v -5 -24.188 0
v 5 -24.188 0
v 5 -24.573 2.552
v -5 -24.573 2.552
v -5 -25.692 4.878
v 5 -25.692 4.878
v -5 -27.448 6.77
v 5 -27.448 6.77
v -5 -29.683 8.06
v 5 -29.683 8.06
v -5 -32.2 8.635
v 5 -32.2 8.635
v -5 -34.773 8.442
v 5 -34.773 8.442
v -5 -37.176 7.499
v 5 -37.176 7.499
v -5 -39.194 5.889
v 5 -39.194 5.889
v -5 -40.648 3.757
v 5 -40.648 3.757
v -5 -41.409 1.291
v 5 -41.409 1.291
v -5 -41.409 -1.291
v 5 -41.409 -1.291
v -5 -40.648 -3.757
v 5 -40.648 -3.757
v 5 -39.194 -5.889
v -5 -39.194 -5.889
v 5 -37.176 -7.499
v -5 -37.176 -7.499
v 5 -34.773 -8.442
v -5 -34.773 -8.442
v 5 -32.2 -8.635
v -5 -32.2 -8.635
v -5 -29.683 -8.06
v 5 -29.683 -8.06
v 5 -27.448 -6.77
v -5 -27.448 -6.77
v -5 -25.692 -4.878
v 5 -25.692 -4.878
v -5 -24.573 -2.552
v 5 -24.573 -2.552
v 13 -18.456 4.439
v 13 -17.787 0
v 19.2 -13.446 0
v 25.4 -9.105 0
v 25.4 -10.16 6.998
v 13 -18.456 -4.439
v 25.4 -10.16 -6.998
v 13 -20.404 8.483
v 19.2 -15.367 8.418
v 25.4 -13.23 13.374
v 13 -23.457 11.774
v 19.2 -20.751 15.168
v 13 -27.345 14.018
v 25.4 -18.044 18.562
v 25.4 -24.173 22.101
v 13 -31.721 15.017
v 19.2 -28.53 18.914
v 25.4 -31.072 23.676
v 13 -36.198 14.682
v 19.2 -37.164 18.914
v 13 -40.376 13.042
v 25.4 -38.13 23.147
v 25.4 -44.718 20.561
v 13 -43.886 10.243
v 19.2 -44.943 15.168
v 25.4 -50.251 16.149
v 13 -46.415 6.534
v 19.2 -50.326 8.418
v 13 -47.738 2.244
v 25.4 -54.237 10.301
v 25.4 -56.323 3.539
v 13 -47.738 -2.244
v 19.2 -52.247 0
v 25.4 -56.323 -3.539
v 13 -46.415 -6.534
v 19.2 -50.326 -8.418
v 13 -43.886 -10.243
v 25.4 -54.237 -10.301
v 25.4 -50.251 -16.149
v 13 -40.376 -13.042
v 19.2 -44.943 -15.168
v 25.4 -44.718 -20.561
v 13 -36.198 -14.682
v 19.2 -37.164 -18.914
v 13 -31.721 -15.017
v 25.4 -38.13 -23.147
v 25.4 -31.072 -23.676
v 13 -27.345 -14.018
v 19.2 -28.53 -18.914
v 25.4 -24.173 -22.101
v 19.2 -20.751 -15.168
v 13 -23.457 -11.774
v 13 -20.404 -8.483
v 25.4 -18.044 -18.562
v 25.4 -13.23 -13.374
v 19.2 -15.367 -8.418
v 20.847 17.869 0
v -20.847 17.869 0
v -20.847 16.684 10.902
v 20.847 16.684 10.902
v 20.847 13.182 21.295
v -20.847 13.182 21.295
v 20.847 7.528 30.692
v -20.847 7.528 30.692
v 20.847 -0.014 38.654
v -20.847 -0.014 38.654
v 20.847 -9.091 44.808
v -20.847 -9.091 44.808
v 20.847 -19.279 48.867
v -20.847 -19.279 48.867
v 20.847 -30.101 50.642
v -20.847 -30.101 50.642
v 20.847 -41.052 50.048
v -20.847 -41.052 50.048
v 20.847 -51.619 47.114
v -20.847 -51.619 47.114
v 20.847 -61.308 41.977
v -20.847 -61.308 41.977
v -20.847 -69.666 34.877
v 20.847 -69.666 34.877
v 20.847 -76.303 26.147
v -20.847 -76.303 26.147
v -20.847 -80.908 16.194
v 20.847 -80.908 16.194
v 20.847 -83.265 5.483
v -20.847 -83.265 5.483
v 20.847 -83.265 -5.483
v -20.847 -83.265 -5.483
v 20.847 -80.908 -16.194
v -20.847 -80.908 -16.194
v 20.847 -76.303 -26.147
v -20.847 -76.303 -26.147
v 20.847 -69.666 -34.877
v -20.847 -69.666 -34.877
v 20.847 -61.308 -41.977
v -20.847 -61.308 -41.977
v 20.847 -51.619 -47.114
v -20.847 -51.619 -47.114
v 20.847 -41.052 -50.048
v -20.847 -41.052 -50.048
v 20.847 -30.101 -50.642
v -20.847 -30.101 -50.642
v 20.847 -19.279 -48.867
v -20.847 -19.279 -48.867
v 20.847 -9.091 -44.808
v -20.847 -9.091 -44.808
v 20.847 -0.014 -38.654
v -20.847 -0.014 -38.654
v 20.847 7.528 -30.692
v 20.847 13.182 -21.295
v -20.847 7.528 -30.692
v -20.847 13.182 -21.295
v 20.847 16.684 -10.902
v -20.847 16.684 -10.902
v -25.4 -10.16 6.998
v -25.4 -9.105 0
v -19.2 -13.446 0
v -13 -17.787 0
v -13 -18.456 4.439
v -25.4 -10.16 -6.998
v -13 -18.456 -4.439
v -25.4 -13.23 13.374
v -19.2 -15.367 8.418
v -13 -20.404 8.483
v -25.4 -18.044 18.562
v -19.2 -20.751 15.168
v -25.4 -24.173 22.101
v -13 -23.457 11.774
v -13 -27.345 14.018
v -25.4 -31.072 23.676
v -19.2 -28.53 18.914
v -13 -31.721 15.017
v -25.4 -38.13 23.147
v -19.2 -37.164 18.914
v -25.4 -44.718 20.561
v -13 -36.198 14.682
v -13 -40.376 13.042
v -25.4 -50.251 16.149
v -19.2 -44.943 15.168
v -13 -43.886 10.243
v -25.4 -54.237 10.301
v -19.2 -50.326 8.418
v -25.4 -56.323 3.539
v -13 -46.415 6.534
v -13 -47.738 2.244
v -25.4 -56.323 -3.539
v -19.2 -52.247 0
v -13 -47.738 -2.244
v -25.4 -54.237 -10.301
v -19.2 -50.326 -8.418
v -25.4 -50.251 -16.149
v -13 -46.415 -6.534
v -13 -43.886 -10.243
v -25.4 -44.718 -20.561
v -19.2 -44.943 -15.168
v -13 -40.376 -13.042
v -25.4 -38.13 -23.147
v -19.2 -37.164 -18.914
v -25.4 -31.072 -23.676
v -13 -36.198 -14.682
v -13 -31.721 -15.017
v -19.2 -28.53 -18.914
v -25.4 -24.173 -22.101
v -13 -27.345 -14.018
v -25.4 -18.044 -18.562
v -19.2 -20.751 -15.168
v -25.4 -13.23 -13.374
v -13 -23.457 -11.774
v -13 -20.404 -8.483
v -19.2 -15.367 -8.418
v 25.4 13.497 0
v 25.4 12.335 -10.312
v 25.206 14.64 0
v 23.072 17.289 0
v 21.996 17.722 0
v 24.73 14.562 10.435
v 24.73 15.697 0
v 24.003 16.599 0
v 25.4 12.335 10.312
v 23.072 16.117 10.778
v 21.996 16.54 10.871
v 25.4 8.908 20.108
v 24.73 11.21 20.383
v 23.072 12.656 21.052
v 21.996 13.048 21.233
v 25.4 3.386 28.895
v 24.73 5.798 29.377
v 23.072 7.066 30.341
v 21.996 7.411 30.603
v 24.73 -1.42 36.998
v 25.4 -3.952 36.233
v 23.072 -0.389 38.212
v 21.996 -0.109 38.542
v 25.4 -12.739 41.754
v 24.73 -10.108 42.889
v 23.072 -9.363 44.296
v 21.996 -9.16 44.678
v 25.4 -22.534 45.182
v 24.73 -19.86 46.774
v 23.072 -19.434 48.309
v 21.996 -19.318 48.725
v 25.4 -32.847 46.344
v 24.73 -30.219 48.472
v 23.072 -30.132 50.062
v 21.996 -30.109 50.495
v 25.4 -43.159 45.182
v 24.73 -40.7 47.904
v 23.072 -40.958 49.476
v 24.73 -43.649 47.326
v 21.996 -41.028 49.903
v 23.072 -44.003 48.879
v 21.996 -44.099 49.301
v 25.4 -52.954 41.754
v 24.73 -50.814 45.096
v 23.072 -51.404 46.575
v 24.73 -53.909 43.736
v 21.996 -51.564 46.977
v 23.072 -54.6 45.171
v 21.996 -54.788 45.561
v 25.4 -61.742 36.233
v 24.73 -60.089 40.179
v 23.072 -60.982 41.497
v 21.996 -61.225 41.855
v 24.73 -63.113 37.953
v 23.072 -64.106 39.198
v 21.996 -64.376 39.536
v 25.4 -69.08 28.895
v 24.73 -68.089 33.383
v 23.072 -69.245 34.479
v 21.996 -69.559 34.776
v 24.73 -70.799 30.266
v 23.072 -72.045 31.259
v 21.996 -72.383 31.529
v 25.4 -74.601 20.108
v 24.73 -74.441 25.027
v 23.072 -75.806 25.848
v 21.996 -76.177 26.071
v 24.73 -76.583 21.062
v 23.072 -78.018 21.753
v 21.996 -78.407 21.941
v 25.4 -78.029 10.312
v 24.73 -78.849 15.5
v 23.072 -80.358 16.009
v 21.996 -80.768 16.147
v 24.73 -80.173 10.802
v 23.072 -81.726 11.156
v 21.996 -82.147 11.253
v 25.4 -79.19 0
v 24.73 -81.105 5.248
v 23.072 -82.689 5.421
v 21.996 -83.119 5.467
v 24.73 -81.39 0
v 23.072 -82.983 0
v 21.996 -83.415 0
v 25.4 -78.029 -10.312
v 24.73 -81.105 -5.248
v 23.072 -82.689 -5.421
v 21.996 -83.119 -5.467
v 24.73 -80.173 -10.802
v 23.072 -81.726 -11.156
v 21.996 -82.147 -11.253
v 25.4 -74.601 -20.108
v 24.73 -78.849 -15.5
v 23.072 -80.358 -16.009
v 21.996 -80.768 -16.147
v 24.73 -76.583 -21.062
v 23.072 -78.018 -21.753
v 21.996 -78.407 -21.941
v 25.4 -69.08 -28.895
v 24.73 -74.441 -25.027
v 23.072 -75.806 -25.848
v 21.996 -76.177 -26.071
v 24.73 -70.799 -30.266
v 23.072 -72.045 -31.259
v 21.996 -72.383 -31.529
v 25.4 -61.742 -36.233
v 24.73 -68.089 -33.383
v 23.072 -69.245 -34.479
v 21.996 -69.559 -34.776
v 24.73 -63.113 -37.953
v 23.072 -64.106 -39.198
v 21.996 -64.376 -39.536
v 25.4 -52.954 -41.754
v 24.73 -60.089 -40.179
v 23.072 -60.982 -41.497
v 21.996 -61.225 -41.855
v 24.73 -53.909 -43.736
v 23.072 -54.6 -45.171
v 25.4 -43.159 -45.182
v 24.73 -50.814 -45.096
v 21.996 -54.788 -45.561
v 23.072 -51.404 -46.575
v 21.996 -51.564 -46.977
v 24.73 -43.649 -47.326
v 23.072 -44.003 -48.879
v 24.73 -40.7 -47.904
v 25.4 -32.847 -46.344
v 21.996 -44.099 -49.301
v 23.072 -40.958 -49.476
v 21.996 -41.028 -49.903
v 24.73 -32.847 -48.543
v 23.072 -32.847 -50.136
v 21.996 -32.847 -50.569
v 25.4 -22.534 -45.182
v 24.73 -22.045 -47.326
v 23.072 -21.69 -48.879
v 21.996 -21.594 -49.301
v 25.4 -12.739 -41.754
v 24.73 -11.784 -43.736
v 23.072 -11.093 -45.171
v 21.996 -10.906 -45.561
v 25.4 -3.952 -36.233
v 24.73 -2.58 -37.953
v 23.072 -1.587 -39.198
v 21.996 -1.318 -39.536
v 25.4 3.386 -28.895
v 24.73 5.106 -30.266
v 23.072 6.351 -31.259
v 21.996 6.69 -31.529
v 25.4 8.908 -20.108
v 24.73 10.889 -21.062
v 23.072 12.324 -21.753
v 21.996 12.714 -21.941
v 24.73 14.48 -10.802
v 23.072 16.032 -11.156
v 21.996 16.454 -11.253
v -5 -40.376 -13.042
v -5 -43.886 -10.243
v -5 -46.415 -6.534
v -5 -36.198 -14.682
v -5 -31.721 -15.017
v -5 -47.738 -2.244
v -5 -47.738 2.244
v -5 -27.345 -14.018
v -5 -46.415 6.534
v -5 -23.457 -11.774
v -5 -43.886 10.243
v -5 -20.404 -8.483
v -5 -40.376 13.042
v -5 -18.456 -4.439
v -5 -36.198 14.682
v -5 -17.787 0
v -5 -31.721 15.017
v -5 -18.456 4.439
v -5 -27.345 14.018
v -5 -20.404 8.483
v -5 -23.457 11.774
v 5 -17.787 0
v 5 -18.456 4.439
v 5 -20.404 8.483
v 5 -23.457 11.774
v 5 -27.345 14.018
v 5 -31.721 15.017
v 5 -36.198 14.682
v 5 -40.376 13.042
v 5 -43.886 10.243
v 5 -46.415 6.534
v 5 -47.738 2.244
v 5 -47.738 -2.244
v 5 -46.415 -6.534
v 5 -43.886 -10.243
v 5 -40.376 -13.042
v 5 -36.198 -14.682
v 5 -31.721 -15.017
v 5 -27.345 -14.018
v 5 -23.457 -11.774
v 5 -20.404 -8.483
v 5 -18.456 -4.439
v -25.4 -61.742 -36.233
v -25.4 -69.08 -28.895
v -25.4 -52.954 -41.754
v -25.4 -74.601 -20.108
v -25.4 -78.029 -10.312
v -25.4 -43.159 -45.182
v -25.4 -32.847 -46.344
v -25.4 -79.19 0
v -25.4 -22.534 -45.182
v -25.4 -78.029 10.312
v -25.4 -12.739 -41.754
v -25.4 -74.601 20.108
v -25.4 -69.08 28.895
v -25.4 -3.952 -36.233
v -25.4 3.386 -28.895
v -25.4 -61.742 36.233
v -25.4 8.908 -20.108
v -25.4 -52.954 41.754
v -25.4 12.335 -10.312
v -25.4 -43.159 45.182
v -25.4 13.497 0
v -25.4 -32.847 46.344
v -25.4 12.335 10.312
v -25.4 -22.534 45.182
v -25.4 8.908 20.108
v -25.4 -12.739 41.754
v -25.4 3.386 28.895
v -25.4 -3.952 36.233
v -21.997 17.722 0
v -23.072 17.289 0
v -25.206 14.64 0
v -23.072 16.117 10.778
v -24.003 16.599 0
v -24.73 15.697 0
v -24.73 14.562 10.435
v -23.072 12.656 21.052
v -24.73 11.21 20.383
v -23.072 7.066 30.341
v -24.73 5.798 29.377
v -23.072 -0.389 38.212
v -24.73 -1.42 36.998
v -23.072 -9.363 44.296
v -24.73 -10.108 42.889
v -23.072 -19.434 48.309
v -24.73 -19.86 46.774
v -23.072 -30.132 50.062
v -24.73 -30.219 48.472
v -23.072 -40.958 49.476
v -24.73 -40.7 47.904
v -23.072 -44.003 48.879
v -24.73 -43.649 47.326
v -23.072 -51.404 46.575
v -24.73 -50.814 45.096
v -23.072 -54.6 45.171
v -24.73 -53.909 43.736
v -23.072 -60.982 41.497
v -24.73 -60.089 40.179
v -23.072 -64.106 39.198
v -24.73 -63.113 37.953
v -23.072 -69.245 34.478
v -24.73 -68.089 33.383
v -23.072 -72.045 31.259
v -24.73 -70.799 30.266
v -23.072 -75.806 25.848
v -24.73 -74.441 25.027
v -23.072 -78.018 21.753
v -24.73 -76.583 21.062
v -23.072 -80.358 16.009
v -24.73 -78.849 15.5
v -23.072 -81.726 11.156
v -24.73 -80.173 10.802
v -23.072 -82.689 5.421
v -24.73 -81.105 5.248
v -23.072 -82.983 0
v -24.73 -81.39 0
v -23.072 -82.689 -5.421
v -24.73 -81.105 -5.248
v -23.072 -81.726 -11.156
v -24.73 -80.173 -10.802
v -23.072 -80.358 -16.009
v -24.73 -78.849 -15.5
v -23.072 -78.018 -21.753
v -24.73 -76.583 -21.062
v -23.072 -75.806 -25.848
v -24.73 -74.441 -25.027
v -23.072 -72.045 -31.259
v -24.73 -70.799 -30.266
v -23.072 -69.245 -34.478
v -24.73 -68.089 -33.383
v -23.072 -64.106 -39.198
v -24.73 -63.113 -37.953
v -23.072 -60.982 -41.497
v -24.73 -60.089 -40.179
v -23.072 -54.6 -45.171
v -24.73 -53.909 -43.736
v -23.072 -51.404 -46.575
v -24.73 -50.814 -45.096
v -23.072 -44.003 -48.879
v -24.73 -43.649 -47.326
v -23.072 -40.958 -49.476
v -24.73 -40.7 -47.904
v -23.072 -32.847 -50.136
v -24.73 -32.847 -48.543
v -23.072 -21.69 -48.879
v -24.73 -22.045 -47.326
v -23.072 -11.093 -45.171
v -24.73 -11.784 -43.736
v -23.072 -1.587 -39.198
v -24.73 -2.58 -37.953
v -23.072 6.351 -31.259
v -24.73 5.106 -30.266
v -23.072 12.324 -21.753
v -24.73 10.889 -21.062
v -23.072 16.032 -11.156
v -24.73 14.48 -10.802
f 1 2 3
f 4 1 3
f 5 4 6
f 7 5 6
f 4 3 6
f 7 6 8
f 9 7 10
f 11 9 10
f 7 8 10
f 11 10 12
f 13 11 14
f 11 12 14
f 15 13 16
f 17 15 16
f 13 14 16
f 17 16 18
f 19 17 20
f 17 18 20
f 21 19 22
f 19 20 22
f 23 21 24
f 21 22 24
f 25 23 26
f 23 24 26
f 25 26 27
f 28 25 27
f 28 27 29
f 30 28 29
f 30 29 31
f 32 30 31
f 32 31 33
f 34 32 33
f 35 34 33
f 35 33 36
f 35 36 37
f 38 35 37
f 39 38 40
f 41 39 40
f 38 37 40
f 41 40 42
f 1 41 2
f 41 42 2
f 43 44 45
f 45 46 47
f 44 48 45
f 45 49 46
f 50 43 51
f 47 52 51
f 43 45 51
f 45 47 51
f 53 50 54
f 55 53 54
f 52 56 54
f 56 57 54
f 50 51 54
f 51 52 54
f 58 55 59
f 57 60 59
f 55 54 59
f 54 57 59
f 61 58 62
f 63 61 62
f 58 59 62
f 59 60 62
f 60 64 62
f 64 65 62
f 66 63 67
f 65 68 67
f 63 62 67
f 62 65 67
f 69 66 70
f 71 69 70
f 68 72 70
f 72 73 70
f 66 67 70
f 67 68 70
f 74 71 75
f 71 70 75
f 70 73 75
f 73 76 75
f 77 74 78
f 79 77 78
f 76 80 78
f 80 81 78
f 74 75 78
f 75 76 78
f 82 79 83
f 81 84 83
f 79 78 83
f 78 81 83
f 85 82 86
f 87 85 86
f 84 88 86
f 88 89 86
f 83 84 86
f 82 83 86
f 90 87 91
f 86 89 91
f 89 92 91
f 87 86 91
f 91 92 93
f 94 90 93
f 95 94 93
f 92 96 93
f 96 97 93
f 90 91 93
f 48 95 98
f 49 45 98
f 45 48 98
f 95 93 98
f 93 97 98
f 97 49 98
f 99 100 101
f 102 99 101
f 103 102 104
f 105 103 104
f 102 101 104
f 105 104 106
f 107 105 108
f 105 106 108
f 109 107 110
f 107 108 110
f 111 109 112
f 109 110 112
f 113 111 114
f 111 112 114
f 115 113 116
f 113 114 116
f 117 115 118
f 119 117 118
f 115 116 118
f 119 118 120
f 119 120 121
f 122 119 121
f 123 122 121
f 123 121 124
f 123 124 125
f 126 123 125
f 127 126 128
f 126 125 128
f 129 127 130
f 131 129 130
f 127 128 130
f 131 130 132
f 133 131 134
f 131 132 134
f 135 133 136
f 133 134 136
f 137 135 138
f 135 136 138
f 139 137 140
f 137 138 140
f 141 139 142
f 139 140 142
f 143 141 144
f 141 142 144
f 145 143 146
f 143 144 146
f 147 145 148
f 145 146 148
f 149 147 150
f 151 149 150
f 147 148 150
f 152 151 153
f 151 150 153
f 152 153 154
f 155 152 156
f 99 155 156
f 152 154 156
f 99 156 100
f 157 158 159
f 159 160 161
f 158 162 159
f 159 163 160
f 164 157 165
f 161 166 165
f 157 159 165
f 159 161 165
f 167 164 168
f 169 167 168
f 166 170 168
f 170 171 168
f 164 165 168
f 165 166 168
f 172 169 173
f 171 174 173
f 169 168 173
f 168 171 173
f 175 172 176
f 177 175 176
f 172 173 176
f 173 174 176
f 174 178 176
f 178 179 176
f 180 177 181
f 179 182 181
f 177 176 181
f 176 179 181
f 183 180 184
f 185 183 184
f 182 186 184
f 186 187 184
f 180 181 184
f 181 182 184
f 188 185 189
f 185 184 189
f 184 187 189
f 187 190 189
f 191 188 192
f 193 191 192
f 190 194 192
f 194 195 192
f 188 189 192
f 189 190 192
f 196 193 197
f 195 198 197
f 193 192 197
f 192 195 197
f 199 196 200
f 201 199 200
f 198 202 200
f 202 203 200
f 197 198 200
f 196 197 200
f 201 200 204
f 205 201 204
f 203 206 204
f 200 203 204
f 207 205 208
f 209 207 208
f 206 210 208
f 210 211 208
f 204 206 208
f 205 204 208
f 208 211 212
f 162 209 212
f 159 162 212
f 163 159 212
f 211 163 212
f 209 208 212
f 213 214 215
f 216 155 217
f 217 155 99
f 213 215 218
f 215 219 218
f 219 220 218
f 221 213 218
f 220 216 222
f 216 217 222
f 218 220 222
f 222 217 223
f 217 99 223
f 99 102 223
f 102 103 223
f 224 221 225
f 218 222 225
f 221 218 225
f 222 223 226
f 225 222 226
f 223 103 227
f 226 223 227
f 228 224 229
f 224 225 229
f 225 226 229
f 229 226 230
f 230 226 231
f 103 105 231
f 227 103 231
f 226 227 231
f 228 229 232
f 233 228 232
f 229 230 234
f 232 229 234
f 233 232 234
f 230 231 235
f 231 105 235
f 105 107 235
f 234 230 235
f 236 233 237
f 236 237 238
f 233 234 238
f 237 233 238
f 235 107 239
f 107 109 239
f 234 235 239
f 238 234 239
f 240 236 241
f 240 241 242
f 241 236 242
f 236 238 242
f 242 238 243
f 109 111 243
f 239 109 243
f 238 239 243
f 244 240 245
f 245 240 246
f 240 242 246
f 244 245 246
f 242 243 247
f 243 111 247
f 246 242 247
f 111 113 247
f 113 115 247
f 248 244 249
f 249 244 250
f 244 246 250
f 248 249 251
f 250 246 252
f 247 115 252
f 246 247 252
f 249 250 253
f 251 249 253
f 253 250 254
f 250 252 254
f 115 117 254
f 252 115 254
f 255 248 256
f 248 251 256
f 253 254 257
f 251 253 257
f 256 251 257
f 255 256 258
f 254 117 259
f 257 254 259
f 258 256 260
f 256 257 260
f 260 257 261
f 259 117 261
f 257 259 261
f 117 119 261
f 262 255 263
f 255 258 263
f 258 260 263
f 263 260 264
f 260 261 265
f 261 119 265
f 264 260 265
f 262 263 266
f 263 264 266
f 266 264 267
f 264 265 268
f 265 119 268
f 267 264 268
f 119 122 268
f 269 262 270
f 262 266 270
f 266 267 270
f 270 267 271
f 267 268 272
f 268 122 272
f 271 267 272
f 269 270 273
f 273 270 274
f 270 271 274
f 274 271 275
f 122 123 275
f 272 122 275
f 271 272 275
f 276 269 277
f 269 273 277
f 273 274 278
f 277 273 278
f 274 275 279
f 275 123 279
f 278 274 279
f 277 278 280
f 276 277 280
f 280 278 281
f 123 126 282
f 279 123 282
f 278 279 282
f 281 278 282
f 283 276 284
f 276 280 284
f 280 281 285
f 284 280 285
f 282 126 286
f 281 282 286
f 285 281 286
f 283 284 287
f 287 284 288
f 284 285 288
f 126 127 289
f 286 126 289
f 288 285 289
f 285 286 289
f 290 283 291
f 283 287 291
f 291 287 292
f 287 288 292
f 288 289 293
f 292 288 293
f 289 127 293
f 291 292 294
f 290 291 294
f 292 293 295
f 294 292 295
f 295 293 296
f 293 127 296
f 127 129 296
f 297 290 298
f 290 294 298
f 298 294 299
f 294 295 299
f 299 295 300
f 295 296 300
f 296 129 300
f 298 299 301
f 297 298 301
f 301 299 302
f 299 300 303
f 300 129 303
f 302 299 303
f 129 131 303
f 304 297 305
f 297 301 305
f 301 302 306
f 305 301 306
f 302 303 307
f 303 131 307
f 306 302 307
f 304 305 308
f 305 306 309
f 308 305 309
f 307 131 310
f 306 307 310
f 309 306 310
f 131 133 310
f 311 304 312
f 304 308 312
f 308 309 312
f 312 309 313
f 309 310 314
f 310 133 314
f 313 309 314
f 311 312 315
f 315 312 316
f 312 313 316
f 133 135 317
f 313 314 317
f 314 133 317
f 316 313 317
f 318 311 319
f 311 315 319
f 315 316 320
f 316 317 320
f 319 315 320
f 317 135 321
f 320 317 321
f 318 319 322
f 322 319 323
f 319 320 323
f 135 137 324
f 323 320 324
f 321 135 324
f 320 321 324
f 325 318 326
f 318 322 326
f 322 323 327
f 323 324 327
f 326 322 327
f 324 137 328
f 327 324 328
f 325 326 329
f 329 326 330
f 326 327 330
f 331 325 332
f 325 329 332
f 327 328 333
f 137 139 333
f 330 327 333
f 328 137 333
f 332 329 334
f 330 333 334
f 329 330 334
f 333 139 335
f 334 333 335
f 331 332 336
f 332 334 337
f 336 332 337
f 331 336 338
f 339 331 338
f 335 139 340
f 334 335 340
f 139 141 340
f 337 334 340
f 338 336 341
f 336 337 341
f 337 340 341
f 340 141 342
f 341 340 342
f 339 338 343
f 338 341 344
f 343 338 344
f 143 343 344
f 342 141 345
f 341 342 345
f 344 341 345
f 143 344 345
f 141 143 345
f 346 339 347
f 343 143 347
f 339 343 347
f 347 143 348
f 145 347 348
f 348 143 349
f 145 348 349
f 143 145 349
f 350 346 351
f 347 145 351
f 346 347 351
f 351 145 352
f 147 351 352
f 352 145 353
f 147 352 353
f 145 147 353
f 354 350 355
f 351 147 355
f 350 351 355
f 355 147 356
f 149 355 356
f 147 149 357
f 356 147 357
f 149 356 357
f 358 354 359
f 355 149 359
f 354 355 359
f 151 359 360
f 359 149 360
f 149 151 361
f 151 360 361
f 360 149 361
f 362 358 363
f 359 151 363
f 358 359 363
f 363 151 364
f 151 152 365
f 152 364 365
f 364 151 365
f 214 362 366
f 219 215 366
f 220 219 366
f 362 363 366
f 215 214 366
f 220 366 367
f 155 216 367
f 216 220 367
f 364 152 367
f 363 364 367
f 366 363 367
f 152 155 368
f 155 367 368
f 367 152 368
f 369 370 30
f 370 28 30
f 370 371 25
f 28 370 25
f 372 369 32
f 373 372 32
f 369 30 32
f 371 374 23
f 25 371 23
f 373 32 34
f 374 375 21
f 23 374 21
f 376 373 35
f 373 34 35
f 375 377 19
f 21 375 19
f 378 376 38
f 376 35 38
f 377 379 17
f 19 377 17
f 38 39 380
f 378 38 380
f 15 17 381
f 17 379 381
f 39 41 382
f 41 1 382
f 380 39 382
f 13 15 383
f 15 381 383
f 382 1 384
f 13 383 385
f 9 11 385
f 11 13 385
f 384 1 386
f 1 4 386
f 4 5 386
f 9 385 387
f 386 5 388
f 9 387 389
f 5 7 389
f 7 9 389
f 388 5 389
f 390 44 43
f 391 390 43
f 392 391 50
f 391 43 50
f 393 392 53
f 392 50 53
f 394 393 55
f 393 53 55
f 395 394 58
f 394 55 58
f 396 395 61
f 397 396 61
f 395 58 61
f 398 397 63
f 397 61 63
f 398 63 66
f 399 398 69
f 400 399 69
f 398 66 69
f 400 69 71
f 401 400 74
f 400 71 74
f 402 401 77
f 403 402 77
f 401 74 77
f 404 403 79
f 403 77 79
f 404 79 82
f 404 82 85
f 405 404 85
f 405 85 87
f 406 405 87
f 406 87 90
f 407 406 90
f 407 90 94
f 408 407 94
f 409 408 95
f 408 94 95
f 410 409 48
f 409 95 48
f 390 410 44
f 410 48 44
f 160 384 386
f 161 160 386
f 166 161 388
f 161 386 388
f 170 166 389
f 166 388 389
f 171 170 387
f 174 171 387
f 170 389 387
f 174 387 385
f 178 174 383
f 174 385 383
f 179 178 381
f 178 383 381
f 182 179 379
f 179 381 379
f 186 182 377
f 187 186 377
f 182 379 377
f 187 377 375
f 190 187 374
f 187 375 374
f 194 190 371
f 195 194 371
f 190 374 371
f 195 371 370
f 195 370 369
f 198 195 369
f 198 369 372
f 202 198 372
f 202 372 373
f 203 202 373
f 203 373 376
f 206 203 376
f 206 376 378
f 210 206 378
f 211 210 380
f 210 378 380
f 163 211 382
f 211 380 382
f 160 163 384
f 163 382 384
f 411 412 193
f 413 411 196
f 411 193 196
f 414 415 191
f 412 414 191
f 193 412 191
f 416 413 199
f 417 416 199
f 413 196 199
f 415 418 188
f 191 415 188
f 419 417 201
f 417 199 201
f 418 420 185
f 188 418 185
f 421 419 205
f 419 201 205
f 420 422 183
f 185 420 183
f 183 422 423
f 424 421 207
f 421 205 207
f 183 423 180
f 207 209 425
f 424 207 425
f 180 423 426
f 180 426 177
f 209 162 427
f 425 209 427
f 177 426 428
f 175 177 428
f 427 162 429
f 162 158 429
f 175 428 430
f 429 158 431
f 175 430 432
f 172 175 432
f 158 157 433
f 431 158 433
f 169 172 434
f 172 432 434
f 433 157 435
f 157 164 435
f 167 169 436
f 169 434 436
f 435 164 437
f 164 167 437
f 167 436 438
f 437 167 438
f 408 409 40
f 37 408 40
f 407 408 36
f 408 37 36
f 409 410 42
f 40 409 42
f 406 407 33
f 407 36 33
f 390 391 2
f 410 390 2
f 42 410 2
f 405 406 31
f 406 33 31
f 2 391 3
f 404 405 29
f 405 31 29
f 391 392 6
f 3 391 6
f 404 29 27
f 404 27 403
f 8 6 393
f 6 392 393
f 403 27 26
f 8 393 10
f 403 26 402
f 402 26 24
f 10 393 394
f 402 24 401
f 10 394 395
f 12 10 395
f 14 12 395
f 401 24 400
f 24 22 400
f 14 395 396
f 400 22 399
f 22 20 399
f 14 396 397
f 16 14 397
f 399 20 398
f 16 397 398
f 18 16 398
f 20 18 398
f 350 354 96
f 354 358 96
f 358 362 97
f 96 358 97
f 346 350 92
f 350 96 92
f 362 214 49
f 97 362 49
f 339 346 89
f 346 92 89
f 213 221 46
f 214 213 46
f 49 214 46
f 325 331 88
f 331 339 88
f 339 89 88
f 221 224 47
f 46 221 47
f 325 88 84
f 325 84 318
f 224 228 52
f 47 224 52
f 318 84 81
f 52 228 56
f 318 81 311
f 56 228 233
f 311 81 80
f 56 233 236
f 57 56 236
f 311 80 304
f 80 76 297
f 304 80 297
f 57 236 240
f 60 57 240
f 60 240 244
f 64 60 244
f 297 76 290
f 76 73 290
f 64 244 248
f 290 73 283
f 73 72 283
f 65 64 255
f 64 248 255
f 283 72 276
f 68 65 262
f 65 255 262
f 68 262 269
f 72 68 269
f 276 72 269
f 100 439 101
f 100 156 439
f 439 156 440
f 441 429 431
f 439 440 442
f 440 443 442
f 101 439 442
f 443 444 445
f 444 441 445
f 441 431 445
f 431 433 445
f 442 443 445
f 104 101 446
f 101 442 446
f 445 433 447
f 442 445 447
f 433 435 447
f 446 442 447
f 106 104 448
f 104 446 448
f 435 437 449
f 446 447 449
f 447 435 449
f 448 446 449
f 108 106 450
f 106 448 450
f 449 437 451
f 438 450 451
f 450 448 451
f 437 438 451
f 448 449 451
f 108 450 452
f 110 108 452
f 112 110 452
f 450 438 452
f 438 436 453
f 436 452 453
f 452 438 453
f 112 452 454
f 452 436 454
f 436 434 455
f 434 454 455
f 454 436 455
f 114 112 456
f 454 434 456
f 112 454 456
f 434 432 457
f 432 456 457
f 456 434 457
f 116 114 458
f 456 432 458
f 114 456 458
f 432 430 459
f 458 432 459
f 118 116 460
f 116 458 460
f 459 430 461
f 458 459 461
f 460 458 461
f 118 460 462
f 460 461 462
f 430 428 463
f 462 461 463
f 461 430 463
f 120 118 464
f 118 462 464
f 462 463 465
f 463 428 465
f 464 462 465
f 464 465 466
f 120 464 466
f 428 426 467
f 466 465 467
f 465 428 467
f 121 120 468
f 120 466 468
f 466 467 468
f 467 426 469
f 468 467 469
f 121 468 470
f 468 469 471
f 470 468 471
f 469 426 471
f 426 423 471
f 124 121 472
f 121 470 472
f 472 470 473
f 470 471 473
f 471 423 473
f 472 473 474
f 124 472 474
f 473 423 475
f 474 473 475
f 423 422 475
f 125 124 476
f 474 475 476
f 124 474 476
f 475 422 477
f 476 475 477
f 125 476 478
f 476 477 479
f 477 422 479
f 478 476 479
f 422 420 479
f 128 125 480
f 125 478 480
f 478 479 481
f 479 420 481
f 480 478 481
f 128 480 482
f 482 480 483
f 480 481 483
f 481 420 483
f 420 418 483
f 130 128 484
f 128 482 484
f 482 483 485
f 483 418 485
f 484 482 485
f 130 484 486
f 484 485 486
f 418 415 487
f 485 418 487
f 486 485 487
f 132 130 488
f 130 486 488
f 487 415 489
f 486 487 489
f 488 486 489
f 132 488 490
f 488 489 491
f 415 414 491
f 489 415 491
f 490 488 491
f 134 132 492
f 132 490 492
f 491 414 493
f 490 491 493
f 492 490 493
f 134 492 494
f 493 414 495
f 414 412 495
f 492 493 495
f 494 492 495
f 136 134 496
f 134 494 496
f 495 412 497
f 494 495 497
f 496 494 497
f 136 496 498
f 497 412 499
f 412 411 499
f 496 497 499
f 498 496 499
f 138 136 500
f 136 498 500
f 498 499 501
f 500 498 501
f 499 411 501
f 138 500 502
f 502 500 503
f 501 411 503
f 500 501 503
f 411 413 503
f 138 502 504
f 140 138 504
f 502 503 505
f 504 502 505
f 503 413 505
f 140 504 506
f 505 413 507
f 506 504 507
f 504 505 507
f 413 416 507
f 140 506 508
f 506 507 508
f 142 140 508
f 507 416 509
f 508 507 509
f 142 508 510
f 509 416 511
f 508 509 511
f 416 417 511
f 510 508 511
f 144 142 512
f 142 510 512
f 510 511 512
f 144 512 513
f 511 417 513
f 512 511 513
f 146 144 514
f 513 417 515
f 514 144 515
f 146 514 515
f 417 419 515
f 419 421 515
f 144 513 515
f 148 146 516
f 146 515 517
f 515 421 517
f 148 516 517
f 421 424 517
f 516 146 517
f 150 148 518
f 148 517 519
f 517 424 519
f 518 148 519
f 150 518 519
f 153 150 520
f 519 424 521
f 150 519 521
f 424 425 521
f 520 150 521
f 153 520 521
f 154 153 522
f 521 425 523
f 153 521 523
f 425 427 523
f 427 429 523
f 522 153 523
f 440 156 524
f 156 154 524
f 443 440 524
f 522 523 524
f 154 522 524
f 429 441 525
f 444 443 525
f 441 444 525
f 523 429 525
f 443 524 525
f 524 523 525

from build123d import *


with BuildPart() as f1:
    # F0 (on Top) → F1 (revolve)
    with BuildSketch(Plane.XY):
        with BuildLine():
            Line((5, -24.18787), (5, -20.135133))
            Line((5, -20.135133), (5, -17.787319))
            Line((5, -17.787319), (13, -17.787319))
            Line((13, -17.787319), (25.4, -9.104746))
            Line((25.4, -9.104746), (25.4, 13.497188))
            ThreePointArc((25.4, 13.497188), (24.003098, 16.599398), (20.846833, 17.869453))
            Line((20.846833, 17.869453), (0, 17.869453))
            Line((0, 17.869453), (-20.847, 17.869453))
            ThreePointArc((-20.847, 17.869453), (-24.003206, 16.599388), (-25.4, 13.497184))
            Line((-25.4, 13.497184), (-25.4, -9.104746))
            Line((-25.4, -9.104746), (-13, -17.787319))
            Line((-13, -17.787319), (-5, -17.787319))
            Line((-5, -17.787319), (-5, -20.135133))
            Line((-5, -20.135133), (-5, -24.18787))
            Line((-5, -24.18787), (5, -24.18787))
        make_face()
    revolve(axis=Axis((1.997764, -32.846637, 0), (1, 0, 0)))

    # F2: F1 across plane


with BuildPart() as f1_1:
    add(f1.part)
    add(f1.part.mirror(Plane.XY))


solid = f1_1.part
